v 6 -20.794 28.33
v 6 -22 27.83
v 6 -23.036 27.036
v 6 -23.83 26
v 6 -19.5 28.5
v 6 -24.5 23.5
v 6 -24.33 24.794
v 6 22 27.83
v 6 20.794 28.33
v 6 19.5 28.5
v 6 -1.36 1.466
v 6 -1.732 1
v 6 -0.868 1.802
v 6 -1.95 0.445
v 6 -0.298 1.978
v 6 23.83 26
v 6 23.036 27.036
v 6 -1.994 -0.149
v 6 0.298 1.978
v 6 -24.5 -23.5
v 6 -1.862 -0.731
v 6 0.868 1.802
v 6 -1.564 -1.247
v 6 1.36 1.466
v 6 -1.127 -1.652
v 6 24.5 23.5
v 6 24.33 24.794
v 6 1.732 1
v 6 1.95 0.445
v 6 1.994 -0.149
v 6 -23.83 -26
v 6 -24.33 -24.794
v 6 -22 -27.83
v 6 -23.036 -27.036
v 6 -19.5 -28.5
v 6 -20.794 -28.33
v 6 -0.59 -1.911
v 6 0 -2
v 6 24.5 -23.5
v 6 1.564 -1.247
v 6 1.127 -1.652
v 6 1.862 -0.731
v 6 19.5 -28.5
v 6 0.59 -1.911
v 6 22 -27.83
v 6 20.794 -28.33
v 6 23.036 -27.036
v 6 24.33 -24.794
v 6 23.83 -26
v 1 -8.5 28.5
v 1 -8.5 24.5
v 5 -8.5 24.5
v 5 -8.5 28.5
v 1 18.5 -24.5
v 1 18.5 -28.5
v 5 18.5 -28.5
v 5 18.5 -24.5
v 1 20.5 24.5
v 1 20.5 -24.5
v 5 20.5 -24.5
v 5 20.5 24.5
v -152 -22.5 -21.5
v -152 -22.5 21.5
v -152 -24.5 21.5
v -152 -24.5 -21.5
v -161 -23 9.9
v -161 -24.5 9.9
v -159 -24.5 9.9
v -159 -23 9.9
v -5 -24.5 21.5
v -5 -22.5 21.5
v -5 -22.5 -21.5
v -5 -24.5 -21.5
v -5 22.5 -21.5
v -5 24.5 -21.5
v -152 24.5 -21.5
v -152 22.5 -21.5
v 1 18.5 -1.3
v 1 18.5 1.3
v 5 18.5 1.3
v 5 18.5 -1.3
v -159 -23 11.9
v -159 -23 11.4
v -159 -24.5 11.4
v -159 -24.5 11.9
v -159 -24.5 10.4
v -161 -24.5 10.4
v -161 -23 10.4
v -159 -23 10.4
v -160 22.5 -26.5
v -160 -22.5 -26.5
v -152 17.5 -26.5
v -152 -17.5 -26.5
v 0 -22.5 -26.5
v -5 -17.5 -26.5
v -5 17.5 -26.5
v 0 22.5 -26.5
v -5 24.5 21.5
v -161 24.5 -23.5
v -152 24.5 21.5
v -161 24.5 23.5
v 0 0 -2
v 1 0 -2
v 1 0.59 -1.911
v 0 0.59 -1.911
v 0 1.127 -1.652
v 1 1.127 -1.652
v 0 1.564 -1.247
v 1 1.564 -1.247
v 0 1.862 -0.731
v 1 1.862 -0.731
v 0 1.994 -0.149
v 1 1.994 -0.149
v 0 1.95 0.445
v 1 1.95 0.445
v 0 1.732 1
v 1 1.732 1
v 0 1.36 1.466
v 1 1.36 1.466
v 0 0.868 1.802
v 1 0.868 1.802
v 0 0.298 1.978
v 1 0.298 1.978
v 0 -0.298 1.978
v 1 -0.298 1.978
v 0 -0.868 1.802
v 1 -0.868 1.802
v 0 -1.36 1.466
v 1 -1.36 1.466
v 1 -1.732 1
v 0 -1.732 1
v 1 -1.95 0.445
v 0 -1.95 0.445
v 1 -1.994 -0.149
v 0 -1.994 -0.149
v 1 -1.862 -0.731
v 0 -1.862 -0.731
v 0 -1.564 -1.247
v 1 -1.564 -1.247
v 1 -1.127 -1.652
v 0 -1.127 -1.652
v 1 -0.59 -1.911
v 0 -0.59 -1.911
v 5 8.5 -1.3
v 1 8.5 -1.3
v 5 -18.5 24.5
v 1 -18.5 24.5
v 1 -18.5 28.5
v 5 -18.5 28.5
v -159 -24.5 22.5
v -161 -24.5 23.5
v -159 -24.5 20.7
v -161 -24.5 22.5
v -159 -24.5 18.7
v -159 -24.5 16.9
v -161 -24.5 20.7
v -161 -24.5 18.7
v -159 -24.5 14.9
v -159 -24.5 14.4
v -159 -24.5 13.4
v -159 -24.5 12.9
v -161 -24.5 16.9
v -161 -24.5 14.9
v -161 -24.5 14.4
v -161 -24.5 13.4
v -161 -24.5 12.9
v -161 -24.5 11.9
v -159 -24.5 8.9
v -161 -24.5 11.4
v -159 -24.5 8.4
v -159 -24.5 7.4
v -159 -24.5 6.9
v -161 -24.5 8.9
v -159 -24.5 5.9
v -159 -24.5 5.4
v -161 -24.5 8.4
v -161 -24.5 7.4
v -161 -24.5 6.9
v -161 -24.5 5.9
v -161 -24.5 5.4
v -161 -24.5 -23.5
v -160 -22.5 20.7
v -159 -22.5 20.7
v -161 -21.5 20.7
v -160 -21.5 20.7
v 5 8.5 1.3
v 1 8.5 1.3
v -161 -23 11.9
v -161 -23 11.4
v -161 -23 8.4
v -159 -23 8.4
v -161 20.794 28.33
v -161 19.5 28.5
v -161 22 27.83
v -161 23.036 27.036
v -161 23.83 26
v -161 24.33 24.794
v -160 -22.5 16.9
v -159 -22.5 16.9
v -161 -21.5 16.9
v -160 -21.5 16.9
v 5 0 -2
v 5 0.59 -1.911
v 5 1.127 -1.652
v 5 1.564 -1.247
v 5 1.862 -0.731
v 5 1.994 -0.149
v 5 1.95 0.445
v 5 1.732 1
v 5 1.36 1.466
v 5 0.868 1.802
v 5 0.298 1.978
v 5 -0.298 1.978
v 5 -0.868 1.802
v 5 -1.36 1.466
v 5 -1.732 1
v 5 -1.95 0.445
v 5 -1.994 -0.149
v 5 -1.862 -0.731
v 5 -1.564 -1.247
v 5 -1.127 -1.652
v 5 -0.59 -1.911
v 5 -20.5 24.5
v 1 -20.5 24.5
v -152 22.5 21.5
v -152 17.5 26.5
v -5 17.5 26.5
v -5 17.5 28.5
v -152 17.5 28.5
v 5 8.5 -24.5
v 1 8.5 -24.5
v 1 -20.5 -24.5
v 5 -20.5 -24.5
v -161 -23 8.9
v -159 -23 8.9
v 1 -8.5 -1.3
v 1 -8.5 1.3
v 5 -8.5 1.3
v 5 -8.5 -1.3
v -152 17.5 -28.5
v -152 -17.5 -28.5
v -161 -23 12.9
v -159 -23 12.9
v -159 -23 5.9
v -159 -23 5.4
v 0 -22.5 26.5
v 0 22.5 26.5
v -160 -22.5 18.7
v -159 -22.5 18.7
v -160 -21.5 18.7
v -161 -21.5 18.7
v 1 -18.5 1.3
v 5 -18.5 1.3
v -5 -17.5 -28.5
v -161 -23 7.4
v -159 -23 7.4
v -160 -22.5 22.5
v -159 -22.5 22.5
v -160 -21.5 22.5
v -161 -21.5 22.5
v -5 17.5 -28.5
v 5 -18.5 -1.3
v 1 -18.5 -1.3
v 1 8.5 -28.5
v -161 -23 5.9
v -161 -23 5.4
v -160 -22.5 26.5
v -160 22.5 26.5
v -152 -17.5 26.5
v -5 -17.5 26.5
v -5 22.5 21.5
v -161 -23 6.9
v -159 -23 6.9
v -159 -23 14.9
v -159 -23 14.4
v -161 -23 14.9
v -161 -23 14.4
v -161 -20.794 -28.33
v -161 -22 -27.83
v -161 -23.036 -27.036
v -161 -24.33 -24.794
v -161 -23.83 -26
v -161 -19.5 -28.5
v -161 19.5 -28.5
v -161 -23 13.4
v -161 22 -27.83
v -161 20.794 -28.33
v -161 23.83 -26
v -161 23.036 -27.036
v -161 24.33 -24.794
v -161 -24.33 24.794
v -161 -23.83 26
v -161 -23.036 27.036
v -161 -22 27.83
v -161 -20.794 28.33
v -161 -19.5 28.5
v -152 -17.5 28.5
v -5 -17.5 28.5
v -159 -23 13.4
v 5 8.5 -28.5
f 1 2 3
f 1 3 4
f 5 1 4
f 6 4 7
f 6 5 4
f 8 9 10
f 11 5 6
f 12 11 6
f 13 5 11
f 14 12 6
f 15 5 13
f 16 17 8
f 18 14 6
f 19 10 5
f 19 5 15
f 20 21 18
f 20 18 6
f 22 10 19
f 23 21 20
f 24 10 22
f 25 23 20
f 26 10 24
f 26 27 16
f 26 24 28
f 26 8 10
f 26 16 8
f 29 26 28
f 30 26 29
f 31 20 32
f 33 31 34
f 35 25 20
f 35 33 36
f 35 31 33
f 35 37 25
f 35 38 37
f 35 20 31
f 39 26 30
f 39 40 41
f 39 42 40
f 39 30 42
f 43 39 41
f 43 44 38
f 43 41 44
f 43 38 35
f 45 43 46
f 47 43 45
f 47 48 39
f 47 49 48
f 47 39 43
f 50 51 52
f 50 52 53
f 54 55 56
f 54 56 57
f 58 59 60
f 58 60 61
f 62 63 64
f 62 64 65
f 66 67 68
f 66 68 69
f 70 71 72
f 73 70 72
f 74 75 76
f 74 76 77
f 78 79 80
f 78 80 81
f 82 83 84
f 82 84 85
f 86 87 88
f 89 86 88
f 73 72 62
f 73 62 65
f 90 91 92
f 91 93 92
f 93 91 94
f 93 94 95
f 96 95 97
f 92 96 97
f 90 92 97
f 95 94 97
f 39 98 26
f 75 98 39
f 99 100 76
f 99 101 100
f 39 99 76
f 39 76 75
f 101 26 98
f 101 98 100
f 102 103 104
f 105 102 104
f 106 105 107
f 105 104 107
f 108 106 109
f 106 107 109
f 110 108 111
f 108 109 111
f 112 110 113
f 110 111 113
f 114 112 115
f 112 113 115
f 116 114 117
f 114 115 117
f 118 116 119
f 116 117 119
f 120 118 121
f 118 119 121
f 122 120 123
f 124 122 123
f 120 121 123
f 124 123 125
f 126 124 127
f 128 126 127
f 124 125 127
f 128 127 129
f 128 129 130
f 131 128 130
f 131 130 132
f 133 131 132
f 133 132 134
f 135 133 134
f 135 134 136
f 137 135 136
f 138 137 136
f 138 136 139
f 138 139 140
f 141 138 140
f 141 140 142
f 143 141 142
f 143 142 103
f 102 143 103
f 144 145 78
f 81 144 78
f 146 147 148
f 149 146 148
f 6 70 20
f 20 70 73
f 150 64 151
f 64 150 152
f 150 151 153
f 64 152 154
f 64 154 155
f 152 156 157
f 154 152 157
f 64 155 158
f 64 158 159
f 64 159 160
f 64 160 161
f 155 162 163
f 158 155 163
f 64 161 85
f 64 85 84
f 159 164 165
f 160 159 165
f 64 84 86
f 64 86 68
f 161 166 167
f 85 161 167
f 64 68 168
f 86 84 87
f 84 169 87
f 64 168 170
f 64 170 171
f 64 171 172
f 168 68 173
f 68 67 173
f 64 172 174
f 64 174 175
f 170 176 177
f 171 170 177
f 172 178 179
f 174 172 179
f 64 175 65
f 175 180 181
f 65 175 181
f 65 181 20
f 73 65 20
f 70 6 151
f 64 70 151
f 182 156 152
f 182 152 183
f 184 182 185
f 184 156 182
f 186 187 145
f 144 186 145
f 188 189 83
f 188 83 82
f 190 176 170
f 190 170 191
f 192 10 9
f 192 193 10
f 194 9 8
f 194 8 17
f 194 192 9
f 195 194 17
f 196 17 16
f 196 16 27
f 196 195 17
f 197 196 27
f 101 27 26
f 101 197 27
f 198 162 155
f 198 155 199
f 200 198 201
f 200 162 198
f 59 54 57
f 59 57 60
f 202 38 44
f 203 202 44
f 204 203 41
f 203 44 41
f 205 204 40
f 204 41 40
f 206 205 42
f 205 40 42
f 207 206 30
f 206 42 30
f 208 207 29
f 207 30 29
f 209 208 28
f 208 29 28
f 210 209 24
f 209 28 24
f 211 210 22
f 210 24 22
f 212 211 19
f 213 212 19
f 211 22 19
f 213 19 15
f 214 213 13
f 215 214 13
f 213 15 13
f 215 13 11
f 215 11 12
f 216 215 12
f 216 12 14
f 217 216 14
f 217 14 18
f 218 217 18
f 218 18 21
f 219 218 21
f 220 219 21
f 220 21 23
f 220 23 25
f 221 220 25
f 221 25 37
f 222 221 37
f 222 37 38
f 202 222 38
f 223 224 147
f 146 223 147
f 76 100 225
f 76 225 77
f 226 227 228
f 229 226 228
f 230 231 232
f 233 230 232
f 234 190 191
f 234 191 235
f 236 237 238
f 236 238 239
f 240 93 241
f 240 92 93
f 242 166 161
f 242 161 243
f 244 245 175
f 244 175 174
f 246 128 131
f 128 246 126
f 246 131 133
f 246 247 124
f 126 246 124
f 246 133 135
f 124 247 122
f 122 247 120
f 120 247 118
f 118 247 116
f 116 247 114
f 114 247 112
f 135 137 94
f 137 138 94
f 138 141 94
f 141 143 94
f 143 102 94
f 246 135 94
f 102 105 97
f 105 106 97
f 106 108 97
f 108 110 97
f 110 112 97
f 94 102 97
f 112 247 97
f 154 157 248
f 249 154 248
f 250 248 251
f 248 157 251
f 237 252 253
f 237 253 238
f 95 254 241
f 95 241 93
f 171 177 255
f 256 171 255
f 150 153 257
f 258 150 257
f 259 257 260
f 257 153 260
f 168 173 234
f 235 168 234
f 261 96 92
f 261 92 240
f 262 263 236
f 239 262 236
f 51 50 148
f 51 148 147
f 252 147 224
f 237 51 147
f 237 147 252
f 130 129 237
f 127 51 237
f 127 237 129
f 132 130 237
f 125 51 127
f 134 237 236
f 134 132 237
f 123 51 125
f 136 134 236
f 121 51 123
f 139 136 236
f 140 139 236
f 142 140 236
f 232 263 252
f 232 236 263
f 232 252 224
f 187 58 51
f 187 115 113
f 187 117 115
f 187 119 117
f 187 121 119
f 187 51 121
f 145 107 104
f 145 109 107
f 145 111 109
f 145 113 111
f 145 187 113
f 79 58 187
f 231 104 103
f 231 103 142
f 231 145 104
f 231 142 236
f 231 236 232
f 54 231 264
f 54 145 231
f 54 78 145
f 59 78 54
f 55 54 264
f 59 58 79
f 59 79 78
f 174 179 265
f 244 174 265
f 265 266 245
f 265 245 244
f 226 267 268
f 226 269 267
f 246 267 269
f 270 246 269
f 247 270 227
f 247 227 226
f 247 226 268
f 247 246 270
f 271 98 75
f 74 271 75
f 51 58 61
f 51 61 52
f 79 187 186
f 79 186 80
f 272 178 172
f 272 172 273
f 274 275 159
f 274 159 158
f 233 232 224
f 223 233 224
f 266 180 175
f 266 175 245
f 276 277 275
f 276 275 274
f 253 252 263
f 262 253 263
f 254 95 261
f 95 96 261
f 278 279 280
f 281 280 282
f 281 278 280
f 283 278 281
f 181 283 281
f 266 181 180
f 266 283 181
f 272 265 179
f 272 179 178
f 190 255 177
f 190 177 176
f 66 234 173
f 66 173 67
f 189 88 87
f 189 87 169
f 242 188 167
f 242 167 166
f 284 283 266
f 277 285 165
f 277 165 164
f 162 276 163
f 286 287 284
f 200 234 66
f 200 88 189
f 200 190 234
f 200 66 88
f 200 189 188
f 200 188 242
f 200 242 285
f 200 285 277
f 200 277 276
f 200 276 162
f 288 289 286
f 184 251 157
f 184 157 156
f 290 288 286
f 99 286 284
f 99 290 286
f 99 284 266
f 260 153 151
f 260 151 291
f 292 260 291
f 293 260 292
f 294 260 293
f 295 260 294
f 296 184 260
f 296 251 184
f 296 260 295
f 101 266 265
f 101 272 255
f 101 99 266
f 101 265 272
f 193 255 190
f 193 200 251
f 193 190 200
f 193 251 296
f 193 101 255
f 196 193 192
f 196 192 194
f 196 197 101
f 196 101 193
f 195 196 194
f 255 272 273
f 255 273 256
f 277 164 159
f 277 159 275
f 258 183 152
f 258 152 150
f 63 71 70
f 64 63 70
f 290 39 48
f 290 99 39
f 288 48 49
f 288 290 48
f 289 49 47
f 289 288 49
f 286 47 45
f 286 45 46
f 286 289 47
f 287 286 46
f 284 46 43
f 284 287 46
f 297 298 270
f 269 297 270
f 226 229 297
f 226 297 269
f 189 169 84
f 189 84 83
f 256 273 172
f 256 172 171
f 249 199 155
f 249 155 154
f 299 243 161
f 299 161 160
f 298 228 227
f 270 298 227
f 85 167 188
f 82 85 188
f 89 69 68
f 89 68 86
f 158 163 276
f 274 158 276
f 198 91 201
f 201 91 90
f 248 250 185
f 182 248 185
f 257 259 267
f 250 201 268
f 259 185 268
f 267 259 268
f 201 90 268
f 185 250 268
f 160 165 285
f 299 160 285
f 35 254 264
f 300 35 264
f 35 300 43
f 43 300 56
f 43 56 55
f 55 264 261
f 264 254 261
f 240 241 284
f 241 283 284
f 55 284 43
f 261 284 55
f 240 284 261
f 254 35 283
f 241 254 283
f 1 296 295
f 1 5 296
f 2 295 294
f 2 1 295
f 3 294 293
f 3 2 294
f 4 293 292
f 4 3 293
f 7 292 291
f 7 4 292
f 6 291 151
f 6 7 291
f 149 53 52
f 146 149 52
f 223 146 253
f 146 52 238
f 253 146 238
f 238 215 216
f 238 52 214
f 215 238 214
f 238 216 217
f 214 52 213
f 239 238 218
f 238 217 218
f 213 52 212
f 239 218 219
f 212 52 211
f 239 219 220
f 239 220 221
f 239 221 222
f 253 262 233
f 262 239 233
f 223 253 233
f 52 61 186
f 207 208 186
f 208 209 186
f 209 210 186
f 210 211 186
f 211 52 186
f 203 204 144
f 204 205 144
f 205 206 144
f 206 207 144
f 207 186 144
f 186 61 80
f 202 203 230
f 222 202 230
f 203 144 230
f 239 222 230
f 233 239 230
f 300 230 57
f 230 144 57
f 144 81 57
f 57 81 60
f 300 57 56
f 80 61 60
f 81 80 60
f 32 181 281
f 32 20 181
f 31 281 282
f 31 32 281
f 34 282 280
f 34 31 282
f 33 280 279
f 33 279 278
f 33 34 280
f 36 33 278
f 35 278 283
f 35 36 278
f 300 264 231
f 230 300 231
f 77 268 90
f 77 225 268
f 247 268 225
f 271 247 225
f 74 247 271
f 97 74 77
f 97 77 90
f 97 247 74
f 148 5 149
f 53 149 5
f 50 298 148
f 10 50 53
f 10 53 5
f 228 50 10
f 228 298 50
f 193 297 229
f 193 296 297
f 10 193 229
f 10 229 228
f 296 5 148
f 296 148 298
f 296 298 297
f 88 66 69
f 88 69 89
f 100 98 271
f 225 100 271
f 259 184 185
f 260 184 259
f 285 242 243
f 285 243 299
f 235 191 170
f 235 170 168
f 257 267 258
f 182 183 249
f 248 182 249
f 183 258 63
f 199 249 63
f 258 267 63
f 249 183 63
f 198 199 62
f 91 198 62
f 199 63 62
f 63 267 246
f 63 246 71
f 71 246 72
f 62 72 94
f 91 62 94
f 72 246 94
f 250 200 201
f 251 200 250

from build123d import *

# Parameters (mm, degrees)
SKETCH_1_W          = 57
SKETCH_1_H          = 49
SKETCH_1_W_2        = 53
SKETCH_1_H_2        = 45
EXTRUDE_1_DEPTH     = 5
EXTRUDE_2_DEPTH     = 147
SKETCH_3_W          = 57
SKETCH_3_H          = 49
SKETCH_3_W_2        = 53
SKETCH_3_H_2        = 45
EXTRUDE_3_DEPTH     = 8
SKETCH_5_W          = 57
SKETCH_5_H          = 49
EXTRUDE_4_DEPTH     = 1
SKETCH_7_W          = 57
SKETCH_7_H          = 49
EXTRUDE_6_DEPTH     = 1
SKETCH_8_W          = 1.8
SKETCH_8_H          = 3
SKETCH_8_W_2        = 0.5
SKETCH_8_H_2        = 1.5
CUT_EXTRUDE_1_DEPTH = 2
SKETCH_9_W          = 2.6
SKETCH_9_H          = 10
EXTRUDE_7_DEPTH     = 4
SKETCH_10_W         = 57
SKETCH_10_H         = 49
EXTRUDE_8_DEPTH     = 1
SKETCH_11_R         = 2
CUT_EXTRUDE_2_DEPTH = 6
FILLET_2_R          = 5


with BuildPart() as part:
    # Эскиз1 → Бобышка-Вытянуть1 (new body)
    with BuildSketch(Plane(origin=(0, 0, 0), x_dir=(0, 0, -1), z_dir=(1, 0, 0))):
        Rectangle(SKETCH_1_W, SKETCH_1_H)
        Rectangle(SKETCH_1_W_2, SKETCH_1_H_2, mode=Mode.SUBTRACT)
    extrude(amount=-EXTRUDE_1_DEPTH)

    # Эскиз2 → Бобышка-Вытянуть2 (add)
    with BuildSketch(Plane(origin=(-5, 0, 0), x_dir=(0, 0, -1), z_dir=(1, 0, 0))):
        Polygon((-28.5, 24.5), (-21.5, 24.5), (-21.5, 22.5), (-26.5, 22.5), (-26.5, 17.5), (-28.5, 17.5), align=None)
        Polygon((-28.5, -24.5), (-28.5, -17.5), (-26.5, -17.5), (-26.5, -22.5), (-21.5, -22.5), (-21.5, -24.5), align=None)
        Polygon((28.5, 24.5), (21.5, 24.5), (21.5, 22.5), (26.5, 22.5), (26.5, 17.5), (28.5, 17.5), align=None)
        Polygon((26.5, -22.5), (21.5, -22.5), (21.5, -24.5), (28.5, -24.5), (28.5, -17.5), (26.5, -17.5), align=None)
    extrude(amount=-EXTRUDE_2_DEPTH)

    # Эскиз3 → Бобышка-Вытянуть3 (add)
    with BuildSketch(Plane(origin=(-152, 0, 0), x_dir=(0, 0, -1), z_dir=(1, 0, 0))):
        Rectangle(SKETCH_3_W, SKETCH_3_H)
        Rectangle(SKETCH_3_W_2, SKETCH_3_H_2, mode=Mode.SUBTRACT)
    extrude(amount=-EXTRUDE_3_DEPTH)

    # Эскиз5 → Бобышка-Вытянуть4 (add)
    with BuildSketch(Plane(origin=(0, 0, 0), x_dir=(0, 0, -1), z_dir=(1, 0, 0))):
        Rectangle(SKETCH_5_W, SKETCH_5_H)
    extrude(amount=EXTRUDE_4_DEPTH)

    # Эскиз7 → Бобышка-Вытянуть6 (add)
    with BuildSketch(Plane.ZY.offset(160)):
        Rectangle(SKETCH_7_W, SKETCH_7_H)
    extrude(amount=EXTRUDE_6_DEPTH)

    # Эскиз8 → Вырез-Вытянуть1 (cut)
    with BuildSketch(Plane.ZY.offset(161)):
        with Locations((21.6, -23)):
            Rectangle(SKETCH_8_W, SKETCH_8_H)
        with Locations((17.8, -23)):
            Rectangle(SKETCH_8_W, SKETCH_8_H)
        with Locations((14.65, -23.75)):
            Rectangle(SKETCH_8_W_2, SKETCH_8_H_2)
        with Locations((13.15, -23.75)):
            Rectangle(SKETCH_8_W_2, SKETCH_8_H_2)
        with Locations((11.65, -23.75)):
            Rectangle(SKETCH_8_W_2, SKETCH_8_H_2)
        with Locations((10.15, -23.75)):
            Rectangle(SKETCH_8_W_2, SKETCH_8_H_2)
        with Locations((8.65, -23.75)):
            Rectangle(SKETCH_8_W_2, SKETCH_8_H_2)
        with Locations((7.15, -23.75)):
            Rectangle(SKETCH_8_W_2, SKETCH_8_H_2)
        with Locations((5.65, -23.75)):
            Rectangle(SKETCH_8_W_2, SKETCH_8_H_2)
    extrude(amount=-CUT_EXTRUDE_1_DEPTH, mode=Mode.SUBTRACT)

    # Эскиз9 → Бобышка-Вытянуть7 (add)
    with BuildSketch(Plane(origin=(1, 0, 0), x_dir=(0, 0, -1), z_dir=(1, 0, 0))):
        Polygon((24.5, -20.5), (-24.5, -20.5), (-24.5, -18.5), (-28.5, -18.5), (-28.5, -24.5), (28.5, -24.5), (28.5, 8.5), (24.5, 8.5), align=None)
        Polygon((24.5, 20.5), (-24.5, 20.5), (-24.5, -8.5), (-28.5, -8.5), (-28.5, 24.5), (28.5, 24.5), (28.5, 18.5), (24.5, 18.5), align=None)
        with Locations((0, -13.5)):
            Rectangle(SKETCH_9_W, SKETCH_9_H)
        with Locations((0, 13.5)):
            Rectangle(SKETCH_9_W, SKETCH_9_H)
    extrude(amount=EXTRUDE_7_DEPTH)

    # Эскиз10 → Бобышка-Вытянуть8 (add)
    with BuildSketch(Plane(origin=(5, 0, 0), x_dir=(0, 0, -1), z_dir=(1, 0, 0))):
        Rectangle(SKETCH_10_W, SKETCH_10_H)
    extrude(amount=EXTRUDE_8_DEPTH)

    # Эскиз11 → Вырез-Вытянуть2 (cut)
    with BuildSketch(Plane(origin=(6, 0, 0), x_dir=(0, 0, -1), z_dir=(1, 0, 0))):
        Circle(SKETCH_11_R)
    extrude(amount=-CUT_EXTRUDE_2_DEPTH, mode=Mode.SUBTRACT)

    # Скругление2
    fillet_2_edges = [part.edges().sort_by_distance(p)[0] for p in [
        (-77.5, 24.5, 28.5),
        (-77.5, 24.5, -28.5),
        (-77.5, -24.5, -28.5),
        (-77.5, -24.5, 28.5),
    ]]
    fillet(fillet_2_edges, radius=FILLET_2_R)


solid = part.part
